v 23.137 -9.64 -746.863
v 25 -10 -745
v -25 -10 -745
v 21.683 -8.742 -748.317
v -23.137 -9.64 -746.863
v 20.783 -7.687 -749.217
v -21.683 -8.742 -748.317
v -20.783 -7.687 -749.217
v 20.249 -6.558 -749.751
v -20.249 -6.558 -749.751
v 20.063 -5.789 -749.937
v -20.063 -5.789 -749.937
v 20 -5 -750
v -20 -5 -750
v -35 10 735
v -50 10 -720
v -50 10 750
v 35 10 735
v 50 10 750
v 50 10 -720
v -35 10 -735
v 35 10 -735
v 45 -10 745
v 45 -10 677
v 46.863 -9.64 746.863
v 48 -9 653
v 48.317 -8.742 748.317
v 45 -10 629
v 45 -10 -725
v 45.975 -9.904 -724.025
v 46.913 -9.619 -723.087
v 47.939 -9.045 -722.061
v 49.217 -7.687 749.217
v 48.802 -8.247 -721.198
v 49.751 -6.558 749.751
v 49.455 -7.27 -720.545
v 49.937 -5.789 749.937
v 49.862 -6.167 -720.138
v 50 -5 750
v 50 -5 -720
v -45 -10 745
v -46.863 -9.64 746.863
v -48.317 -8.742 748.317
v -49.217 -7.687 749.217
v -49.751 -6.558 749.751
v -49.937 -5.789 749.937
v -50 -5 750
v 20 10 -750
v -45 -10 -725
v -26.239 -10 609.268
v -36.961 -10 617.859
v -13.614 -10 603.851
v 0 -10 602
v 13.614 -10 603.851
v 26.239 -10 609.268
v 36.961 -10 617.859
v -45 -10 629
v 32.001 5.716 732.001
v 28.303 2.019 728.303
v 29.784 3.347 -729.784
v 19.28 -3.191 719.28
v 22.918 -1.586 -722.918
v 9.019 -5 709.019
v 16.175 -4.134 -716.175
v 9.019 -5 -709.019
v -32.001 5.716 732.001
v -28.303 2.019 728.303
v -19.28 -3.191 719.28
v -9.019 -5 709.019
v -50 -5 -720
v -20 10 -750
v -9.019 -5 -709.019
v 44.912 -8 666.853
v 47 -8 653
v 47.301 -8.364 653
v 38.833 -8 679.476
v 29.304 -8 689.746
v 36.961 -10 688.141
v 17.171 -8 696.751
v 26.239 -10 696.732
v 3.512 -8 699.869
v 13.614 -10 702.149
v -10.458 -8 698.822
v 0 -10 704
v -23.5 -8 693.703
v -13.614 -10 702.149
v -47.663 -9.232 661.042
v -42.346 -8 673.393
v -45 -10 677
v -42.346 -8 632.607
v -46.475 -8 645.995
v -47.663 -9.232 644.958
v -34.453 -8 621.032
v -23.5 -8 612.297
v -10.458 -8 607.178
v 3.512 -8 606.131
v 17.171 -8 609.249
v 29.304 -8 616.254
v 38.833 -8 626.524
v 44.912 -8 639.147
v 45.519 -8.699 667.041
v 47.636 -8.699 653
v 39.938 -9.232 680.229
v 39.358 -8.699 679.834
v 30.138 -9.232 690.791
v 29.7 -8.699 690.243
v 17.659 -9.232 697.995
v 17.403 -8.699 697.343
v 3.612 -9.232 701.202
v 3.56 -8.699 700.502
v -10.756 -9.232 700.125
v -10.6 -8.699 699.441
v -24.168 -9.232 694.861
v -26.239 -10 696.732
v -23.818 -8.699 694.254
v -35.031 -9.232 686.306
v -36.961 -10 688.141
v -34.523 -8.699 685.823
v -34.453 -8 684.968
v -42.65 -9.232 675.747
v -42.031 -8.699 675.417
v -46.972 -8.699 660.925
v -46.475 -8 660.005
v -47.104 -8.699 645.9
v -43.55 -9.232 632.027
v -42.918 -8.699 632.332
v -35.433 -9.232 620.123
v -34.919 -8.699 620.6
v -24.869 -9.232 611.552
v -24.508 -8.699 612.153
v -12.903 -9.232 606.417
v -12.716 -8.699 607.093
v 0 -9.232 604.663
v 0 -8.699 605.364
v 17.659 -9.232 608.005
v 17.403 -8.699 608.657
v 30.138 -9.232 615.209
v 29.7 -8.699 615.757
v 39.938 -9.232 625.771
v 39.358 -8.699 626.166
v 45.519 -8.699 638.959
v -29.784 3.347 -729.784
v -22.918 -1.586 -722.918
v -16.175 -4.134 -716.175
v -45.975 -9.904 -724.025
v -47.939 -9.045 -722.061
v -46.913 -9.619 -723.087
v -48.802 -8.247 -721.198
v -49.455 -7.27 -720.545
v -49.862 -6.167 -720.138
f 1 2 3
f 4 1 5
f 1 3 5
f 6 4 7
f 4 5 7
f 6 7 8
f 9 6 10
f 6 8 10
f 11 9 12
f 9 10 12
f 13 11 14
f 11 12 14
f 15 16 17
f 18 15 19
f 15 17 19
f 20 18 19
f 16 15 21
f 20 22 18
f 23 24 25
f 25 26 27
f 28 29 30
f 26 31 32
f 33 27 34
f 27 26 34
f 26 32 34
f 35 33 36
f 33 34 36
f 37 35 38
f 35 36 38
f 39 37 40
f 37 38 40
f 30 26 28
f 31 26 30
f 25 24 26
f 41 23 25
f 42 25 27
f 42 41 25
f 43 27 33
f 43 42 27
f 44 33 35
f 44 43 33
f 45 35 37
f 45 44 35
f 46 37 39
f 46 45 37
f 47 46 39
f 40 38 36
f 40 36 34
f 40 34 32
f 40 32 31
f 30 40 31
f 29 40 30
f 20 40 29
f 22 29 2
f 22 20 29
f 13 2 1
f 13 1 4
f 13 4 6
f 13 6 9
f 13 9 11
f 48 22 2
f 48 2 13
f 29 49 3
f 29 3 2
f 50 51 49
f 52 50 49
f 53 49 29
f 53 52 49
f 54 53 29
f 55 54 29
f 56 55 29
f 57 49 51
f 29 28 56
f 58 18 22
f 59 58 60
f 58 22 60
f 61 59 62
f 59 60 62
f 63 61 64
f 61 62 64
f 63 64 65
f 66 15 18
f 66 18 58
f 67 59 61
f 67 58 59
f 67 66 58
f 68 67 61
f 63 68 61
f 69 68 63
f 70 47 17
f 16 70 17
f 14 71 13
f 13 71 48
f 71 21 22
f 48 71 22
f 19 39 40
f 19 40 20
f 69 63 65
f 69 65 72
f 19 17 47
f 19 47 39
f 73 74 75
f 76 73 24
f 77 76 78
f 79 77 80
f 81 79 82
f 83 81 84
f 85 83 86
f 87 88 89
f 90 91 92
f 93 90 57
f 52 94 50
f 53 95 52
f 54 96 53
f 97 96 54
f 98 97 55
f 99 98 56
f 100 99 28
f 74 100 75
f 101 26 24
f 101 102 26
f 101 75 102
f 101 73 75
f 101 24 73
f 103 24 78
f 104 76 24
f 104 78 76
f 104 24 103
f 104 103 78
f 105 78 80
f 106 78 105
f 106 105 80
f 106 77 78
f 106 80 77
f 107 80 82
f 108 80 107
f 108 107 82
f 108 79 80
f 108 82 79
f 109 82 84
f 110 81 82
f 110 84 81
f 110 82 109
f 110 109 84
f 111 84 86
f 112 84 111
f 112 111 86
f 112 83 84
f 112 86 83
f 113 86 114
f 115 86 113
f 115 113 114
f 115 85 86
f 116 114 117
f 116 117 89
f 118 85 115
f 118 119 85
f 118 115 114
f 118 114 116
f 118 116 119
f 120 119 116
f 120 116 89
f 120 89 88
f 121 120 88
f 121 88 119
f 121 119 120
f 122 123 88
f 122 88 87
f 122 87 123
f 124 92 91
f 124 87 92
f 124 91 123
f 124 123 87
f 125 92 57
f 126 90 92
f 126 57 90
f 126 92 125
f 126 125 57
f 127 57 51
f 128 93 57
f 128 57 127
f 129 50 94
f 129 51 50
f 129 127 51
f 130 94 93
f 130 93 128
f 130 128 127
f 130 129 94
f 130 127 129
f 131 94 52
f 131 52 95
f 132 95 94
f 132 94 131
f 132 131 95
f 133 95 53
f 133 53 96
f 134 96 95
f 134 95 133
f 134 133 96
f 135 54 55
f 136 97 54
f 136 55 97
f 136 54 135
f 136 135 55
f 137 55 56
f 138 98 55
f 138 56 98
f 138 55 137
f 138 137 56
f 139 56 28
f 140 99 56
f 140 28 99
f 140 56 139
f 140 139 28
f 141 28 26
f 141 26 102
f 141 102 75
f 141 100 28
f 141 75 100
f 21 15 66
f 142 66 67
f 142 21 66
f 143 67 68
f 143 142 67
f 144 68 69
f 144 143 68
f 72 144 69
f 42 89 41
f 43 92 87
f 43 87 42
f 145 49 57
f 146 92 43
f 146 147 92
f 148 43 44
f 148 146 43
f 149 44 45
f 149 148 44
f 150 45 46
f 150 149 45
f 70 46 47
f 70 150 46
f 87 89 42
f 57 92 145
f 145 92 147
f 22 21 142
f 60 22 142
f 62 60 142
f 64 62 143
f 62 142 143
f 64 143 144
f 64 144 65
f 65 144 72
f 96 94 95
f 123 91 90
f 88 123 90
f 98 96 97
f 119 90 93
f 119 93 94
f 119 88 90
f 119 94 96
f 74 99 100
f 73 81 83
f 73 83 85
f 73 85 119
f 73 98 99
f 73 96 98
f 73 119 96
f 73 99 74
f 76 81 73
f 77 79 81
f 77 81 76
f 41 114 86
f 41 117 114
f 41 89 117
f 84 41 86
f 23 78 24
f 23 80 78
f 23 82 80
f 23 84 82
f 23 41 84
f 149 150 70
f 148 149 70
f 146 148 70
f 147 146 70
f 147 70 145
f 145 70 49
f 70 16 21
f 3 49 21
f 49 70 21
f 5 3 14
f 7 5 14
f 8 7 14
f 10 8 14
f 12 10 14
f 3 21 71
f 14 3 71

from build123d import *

# Parameters (mm, degrees)
F0_W        = 100
F0_H        = 20
F1_DEPTH    = 750
F2_R        = 47
F3_DEPTH    = 2
F4_W        = 70
F4_H        = 1470
F5_DEPTH    = 15
F6_T1_DEPTH = 70
F6_T3_DEPTH = 1470
F7_T1_DEPTH = 125
F7_T3_DEPTH = 1525
F8_T1_DEPTH = 169.300979278


# Not quite as in the source:
# - a fillet or chamfer that OpenCascade refuses, or shapes differently, is made with other operations: its cross-section is extruded or revolved along the edge and cut away or added


with BuildPart() as f1:
    # F0 (on Top) → F1 (new body, symmetric)
    with BuildSketch(Plane.XY):
        Rectangle(F0_W, F0_H)
    extrude(amount=F1_DEPTH, both=True)

    # F2 (on face) → F3 (cut)
    with BuildSketch(Plane.XZ.offset(10)):
        with Locations((0, 653)):
            Circle(F2_R)
    extrude(amount=-F3_DEPTH, mode=Mode.SUBTRACT)

    # F4 (on face) → F5 (cut)
    with BuildSketch(Plane(origin=(0, 10, 0), x_dir=(-1, 0, 0), z_dir=(0, 1, 0))):
        Rectangle(F4_W, F4_H)
    extrude(amount=-F5_DEPTH, mode=Mode.SUBTRACT)

    # F6: fillet of radius 30 on 4 edges, made by hand

    # F6_s2 → F6_t1 (join)
    with BuildSketch(Plane.YZ.offset(-35)):
        with BuildLine():
            ThreePointArc((10, 735), (-0.9807621135, 724.0192378865), (-5, 709.0192378865))
            Line((-5, 709.0192378865), (-5, 735))
            Line((-5, 735), (10, 735))
        make_face()
        with BuildLine():
            ThreePointArc((10, -735), (-0.9807621135, -724.0192378865), (-5, -709.0192378865))
            Line((-5, -709.0192378865), (-5, -735))
            Line((-5, -735), (10, -735))
        make_face()
    extrude(amount=F6_T1_DEPTH)

    # F6_s4 → F6_t3 (join)
    with BuildSketch(Plane.XY.offset(-735)):
        with BuildLine():
            ThreePointArc((35, 10), (24.0192378865, -0.9807621135), (9.0192378865, -5))
            Line((9.0192378865, -5), (35, -5))
            Line((35, -5), (35, 10))
        make_face()
        with BuildLine():
            ThreePointArc((-35, 10), (-24.0192378865, -0.9807621135), (-9.0192378865, -5))
            Line((-9.0192378865, -5), (-35, -5))
            Line((-35, -5), (-35, 10))
        make_face()
    extrude(amount=F6_T3_DEPTH)

    # F7: fillet of radius 5 on 5 edges, made by hand

    # F7_s2 → F7_t1 (cut)
    with BuildSketch(Plane.YZ.offset(-62.5)):
        with BuildLine():
            ThreePointArc((-10, -745), (-8.5355339059, -748.5355339059), (-5, -750))
            Line((-5, -750), (-10, -750))
            Line((-10, -750), (-10, -745))
        make_face()
        with BuildLine():
            ThreePointArc((-10, 745), (-8.5355339059, 748.5355339059), (-5, 750))
            Line((-5, 750), (-10, 750))
            Line((-10, 750), (-10, 745))
        make_face()
    extrude(amount=F7_T1_DEPTH, mode=Mode.SUBTRACT)

    # F7_s4 → F7_t3 (cut)
    with BuildSketch(Plane.XY.offset(-762.5)):
        with BuildLine():
            ThreePointArc((-45, -10), (-48.5355339059, -8.5355339059), (-50, -5))
            Line((-50, -5), (-50, -10))
            Line((-50, -10), (-45, -10))
        make_face()
        with BuildLine():
            ThreePointArc((45, -10), (48.5355339059, -8.5355339059), (50, -5))
            Line((50, -5), (50, -10))
            Line((50, -10), (45, -10))
        make_face()
    extrude(amount=F7_T3_DEPTH, mode=Mode.SUBTRACT)

    # F7_s5 → F7_t6 (revolve, cut)
    with BuildSketch(Plane.XY.offset(653)):
        with BuildLine():
            ThreePointArc((51, -10), (48.7639320225, -9.472135955), (47, -8))
            Line((47, -8), (47, -10))
            Line((47, -10), (51, -10))
        make_face()
    revolve(axis=Axis((0, -10, 653), (0, -1, 0)), mode=Mode.SUBTRACT)

    # F8: chamfer of 30 on 2 edges, made by hand

    # F8_s2 → F8_t1 (cut)
    with BuildSketch(Plane.XZ.offset(-87.150489639)):
        Polygon((50, -720), (20, -750), (50, -750), align=None)
        Polygon((-50, -720), (-20, -750), (-50, -750), align=None)
    extrude(amount=F8_T1_DEPTH, mode=Mode.SUBTRACT)


solid = f1.part
